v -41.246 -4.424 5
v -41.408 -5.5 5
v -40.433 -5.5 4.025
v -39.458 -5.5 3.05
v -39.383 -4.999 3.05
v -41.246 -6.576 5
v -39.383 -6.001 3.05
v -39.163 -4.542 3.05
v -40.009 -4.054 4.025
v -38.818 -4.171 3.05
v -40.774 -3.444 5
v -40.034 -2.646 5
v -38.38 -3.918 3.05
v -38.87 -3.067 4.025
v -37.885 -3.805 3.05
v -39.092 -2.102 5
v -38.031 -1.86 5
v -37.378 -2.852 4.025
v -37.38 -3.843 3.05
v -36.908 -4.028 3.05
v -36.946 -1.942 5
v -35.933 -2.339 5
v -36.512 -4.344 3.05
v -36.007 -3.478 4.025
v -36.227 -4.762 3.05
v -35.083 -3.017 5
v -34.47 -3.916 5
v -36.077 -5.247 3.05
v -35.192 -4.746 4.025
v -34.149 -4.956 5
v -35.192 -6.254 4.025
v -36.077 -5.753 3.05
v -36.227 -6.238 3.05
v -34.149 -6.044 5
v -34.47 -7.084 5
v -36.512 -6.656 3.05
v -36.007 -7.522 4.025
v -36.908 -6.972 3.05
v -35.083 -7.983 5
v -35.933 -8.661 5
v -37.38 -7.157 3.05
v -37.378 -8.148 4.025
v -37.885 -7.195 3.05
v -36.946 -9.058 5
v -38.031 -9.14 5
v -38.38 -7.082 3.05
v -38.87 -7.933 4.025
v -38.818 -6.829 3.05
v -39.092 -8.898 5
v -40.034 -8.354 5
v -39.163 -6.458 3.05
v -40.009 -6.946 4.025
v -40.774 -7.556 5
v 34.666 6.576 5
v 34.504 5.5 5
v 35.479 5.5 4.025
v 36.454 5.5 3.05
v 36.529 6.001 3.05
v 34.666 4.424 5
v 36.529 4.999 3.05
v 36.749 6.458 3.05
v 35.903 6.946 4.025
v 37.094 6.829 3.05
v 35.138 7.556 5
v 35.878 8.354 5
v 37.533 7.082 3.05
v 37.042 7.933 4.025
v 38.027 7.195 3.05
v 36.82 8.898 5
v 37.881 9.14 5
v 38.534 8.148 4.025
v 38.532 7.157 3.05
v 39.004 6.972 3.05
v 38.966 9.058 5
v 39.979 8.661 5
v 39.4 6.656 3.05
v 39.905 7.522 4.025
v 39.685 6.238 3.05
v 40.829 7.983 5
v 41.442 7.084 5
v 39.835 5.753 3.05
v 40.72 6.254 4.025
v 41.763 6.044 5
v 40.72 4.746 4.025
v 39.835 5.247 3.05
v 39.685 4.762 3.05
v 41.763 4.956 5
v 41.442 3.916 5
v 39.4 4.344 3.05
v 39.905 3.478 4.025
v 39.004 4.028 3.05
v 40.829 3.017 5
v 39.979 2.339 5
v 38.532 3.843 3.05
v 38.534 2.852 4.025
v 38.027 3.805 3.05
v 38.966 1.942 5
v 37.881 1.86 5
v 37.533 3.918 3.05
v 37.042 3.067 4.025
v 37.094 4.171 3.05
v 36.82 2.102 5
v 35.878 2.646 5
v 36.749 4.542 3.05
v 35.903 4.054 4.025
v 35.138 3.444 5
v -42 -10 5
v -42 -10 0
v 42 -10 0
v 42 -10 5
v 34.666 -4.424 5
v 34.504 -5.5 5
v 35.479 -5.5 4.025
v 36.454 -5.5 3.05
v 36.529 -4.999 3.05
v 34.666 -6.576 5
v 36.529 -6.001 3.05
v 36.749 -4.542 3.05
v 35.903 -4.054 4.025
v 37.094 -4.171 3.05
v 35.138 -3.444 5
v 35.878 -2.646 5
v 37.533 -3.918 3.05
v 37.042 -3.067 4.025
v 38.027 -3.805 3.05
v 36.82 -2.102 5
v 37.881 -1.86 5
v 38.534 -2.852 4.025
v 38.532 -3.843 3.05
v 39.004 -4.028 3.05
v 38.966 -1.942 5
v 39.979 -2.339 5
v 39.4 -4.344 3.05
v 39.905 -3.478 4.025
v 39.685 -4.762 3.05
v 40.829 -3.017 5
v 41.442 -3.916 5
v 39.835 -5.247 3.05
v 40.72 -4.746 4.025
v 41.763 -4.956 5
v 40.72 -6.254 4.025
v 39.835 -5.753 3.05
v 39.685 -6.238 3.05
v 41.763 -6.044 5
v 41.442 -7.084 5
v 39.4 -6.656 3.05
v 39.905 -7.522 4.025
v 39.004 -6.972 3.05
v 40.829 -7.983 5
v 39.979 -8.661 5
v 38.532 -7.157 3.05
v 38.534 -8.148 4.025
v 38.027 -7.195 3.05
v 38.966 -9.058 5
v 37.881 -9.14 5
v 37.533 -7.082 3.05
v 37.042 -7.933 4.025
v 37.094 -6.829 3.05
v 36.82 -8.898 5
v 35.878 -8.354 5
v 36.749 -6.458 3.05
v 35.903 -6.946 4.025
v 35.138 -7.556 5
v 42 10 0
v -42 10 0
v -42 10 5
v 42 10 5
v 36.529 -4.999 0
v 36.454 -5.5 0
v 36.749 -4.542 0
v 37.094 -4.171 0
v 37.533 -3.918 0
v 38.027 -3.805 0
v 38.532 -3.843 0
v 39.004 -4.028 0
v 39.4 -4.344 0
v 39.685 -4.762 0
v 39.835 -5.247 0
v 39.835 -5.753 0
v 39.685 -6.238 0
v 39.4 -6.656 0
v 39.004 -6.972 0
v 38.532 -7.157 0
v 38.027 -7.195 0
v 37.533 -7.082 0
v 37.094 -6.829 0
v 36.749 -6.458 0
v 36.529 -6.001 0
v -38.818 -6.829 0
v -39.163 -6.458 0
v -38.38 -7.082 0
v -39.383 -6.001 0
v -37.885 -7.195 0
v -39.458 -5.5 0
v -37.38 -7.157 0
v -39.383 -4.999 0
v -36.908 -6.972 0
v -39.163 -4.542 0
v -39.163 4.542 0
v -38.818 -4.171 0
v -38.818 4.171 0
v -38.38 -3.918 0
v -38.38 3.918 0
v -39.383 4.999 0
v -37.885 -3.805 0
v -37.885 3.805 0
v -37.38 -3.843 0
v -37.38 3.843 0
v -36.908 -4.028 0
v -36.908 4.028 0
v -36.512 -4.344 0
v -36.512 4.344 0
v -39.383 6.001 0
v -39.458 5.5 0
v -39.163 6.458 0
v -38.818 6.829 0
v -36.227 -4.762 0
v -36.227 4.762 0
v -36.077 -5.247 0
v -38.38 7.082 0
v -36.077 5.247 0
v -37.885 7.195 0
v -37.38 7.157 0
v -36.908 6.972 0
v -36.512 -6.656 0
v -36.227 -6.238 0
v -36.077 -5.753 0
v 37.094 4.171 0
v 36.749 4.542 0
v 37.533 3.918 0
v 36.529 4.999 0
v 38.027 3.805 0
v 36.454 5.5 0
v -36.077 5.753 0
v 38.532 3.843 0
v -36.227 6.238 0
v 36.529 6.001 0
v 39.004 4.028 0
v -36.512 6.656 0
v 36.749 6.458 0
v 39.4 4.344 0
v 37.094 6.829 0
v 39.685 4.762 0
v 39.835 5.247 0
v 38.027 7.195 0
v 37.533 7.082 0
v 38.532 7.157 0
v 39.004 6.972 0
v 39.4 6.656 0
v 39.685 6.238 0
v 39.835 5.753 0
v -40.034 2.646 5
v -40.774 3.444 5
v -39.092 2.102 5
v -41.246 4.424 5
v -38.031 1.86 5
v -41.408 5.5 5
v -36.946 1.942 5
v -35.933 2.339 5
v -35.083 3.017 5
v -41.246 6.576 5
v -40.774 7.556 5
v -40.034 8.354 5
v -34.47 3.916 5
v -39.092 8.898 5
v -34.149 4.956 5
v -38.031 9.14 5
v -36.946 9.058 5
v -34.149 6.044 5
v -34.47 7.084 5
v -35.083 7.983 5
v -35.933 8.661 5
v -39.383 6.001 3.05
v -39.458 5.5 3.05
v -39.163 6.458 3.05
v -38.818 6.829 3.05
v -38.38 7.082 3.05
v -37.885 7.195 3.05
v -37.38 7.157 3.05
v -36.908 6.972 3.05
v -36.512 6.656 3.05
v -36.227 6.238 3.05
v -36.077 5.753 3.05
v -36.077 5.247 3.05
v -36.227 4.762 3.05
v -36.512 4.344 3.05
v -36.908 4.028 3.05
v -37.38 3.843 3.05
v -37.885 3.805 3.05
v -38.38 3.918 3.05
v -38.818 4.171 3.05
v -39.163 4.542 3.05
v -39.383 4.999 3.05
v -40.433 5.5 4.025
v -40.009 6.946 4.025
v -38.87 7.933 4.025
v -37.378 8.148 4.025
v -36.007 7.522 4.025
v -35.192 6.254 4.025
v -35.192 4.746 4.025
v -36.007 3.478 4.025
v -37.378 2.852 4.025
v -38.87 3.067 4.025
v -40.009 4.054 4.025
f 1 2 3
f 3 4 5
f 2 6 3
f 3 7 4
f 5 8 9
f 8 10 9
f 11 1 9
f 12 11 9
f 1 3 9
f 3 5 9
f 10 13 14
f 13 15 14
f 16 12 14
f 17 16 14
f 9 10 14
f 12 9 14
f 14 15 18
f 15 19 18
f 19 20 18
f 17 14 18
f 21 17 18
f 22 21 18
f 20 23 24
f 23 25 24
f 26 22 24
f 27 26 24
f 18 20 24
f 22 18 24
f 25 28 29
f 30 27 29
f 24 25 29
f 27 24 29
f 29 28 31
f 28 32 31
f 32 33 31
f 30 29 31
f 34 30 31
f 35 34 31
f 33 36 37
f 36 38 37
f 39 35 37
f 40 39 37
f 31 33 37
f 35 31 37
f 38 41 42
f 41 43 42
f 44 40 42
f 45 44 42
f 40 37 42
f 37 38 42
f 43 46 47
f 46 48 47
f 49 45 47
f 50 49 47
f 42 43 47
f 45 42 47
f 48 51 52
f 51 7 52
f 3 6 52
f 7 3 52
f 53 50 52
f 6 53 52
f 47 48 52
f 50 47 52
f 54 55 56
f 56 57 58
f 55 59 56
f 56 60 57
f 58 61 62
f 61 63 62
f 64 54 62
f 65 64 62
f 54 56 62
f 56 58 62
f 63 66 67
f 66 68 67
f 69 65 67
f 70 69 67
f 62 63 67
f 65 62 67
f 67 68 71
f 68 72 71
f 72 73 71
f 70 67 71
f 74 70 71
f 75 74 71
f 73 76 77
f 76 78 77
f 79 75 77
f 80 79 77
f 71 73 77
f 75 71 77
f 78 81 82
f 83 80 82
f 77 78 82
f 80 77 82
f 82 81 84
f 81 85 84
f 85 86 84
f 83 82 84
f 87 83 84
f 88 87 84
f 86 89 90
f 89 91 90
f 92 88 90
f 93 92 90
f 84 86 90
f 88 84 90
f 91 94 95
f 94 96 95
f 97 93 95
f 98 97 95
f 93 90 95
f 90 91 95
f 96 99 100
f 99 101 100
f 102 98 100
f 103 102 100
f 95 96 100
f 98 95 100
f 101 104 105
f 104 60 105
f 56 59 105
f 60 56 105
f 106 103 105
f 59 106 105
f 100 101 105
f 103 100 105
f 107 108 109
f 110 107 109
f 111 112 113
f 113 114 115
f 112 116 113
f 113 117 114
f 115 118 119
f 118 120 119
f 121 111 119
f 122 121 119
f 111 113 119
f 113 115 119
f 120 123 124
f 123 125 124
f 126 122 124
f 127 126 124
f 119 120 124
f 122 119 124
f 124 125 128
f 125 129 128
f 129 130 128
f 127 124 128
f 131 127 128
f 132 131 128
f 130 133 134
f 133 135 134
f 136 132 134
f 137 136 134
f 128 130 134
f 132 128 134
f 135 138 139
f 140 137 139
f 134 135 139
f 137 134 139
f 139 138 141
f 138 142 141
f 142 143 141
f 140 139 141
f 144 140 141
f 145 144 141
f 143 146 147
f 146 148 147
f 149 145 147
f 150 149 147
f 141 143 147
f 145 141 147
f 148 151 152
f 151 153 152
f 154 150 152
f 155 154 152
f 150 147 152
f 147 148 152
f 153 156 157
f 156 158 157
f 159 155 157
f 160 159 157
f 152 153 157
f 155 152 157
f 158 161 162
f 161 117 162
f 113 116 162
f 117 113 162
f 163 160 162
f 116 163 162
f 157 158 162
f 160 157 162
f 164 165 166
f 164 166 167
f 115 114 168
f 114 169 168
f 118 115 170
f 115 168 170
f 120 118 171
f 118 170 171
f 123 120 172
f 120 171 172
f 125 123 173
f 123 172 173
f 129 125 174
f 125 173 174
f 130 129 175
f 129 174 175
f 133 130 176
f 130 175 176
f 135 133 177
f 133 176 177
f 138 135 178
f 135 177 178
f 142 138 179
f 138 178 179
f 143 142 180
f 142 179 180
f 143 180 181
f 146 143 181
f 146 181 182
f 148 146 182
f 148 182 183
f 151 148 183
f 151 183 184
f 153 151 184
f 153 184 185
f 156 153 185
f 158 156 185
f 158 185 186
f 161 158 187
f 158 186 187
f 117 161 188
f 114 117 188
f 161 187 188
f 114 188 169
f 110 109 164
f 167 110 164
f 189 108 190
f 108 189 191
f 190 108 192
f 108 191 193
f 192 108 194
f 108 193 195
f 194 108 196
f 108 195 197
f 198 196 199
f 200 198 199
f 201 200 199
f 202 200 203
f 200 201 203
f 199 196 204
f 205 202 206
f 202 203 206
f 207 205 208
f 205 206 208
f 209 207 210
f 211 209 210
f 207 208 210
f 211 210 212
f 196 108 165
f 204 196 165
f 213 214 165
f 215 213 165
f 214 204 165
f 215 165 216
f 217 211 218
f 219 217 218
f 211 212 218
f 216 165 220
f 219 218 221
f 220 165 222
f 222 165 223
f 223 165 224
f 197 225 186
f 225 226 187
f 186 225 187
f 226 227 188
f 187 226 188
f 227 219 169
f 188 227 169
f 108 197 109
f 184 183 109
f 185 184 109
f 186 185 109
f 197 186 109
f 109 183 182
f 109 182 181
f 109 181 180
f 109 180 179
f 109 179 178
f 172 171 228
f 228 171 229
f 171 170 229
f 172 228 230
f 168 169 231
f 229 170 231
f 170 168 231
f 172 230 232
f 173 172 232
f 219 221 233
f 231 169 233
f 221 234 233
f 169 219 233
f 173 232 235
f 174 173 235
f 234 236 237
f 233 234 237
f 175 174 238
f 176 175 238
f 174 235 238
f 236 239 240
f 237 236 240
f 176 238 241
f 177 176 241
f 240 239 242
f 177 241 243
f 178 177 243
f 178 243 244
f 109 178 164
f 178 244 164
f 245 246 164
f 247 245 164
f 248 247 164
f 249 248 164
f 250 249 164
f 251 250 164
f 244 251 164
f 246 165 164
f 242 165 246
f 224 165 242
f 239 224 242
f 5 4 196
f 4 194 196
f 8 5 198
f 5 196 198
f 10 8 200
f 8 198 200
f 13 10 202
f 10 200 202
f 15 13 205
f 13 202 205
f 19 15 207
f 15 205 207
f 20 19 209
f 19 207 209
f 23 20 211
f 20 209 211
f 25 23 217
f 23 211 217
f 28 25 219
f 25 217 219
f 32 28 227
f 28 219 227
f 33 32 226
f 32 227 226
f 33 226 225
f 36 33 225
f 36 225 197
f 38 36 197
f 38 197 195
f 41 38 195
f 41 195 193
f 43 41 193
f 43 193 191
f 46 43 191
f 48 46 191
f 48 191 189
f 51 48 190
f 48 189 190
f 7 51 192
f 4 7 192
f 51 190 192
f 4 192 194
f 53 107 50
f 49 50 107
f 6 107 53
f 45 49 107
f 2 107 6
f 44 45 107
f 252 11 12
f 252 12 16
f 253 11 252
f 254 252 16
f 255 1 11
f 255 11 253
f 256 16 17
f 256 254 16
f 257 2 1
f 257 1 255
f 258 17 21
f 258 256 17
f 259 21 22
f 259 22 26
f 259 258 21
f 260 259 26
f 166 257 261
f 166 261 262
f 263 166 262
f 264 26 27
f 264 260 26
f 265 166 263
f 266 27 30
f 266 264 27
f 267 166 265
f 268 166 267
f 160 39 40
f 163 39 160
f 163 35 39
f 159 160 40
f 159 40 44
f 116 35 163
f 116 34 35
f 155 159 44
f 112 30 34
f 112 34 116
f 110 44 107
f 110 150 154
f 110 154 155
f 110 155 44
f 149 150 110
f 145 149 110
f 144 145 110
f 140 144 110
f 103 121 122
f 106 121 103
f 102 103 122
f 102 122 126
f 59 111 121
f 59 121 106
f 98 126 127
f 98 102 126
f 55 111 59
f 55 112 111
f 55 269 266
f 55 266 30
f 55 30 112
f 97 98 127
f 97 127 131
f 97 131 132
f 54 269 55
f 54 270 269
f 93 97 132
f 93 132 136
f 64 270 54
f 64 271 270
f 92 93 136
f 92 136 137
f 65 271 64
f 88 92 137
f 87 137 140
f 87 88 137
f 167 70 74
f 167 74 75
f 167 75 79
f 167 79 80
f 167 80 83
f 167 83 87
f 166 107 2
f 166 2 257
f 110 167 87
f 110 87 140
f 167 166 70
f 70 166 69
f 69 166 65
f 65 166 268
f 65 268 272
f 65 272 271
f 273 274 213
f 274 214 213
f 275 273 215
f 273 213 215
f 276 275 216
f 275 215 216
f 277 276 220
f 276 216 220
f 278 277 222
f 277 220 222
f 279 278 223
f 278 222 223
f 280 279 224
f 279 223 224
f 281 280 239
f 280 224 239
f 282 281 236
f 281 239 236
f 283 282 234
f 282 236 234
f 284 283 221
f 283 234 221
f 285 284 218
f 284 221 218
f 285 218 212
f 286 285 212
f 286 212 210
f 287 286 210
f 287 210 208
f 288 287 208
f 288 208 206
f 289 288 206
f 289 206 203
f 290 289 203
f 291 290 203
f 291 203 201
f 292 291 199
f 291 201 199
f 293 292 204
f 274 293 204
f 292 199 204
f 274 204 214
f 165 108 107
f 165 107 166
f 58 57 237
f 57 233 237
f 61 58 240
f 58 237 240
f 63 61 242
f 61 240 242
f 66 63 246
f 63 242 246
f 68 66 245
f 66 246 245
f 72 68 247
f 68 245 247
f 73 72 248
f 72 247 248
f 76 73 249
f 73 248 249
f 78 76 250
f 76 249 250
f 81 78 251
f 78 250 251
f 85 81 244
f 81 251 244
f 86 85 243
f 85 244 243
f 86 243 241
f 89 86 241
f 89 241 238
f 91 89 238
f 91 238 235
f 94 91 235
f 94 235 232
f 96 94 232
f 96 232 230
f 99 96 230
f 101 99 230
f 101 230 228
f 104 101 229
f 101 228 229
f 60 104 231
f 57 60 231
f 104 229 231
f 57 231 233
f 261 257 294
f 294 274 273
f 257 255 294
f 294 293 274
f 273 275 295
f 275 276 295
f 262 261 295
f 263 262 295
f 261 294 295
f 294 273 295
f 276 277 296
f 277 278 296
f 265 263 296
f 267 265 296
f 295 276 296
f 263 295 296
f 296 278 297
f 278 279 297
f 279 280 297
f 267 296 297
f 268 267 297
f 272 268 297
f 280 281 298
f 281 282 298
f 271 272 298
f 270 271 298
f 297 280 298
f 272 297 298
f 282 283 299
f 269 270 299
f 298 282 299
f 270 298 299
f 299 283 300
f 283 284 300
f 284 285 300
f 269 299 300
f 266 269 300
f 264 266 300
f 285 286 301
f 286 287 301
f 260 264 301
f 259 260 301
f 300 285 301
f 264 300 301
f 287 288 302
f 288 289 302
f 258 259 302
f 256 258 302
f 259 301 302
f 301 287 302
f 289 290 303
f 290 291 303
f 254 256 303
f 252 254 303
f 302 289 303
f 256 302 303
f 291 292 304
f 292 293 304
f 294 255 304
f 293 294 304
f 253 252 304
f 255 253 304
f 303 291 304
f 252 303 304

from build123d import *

# Parameters (mm, degrees)
SKETCH1_W                                       = 84
SKETCH1_H                                       = 20
BOSS_EXTRUDE1_DEPTH                             = 5
CSK_FOR_M3_FLAT_HEAD_MACHINE_SCREW1_D           = 3.4
CSK_FOR_M3_FLAT_HEAD_MACHINE_SCREW1_DEPTH       = 12
CSK_FOR_M3_FLAT_HEAD_MACHINE_SCREW1_CSINK_D     = 7.3
CSK_FOR_M3_FLAT_HEAD_MACHINE_SCREW1_CSINK_ANGLE = 90
CSK_FOR_M3_FLAT_HEAD_MACHINE_SCREW1_TIP         = 1.021463052


with BuildPart() as part:
    # Sketch1 → Boss-Extrude1 (new body)
    with BuildSketch(Plane.XY):
        Rectangle(SKETCH1_W, SKETCH1_H)
    extrude(amount=BOSS_EXTRUDE1_DEPTH)

    # CSK for M3 Flat Head Machine Screw1
    with Locations(Plane.XY.offset(5)):
        with Locations((38.153654124, 5.5), (38.153654124, -5.5), (-37.758420274, 5.5), (-37.758420274, -5.5)):
            CounterSinkHole(CSK_FOR_M3_FLAT_HEAD_MACHINE_SCREW1_D / 2, CSK_FOR_M3_FLAT_HEAD_MACHINE_SCREW1_CSINK_D / 2, depth=CSK_FOR_M3_FLAT_HEAD_MACHINE_SCREW1_DEPTH, counter_sink_angle=CSK_FOR_M3_FLAT_HEAD_MACHINE_SCREW1_CSINK_ANGLE)
            with Locations((0, 0, -(CSK_FOR_M3_FLAT_HEAD_MACHINE_SCREW1_DEPTH + CSK_FOR_M3_FLAT_HEAD_MACHINE_SCREW1_TIP / 2))):  # 118° drill point
                Cone(0, CSK_FOR_M3_FLAT_HEAD_MACHINE_SCREW1_D / 2, CSK_FOR_M3_FLAT_HEAD_MACHINE_SCREW1_TIP, mode=Mode.SUBTRACT)


solid = part.part
